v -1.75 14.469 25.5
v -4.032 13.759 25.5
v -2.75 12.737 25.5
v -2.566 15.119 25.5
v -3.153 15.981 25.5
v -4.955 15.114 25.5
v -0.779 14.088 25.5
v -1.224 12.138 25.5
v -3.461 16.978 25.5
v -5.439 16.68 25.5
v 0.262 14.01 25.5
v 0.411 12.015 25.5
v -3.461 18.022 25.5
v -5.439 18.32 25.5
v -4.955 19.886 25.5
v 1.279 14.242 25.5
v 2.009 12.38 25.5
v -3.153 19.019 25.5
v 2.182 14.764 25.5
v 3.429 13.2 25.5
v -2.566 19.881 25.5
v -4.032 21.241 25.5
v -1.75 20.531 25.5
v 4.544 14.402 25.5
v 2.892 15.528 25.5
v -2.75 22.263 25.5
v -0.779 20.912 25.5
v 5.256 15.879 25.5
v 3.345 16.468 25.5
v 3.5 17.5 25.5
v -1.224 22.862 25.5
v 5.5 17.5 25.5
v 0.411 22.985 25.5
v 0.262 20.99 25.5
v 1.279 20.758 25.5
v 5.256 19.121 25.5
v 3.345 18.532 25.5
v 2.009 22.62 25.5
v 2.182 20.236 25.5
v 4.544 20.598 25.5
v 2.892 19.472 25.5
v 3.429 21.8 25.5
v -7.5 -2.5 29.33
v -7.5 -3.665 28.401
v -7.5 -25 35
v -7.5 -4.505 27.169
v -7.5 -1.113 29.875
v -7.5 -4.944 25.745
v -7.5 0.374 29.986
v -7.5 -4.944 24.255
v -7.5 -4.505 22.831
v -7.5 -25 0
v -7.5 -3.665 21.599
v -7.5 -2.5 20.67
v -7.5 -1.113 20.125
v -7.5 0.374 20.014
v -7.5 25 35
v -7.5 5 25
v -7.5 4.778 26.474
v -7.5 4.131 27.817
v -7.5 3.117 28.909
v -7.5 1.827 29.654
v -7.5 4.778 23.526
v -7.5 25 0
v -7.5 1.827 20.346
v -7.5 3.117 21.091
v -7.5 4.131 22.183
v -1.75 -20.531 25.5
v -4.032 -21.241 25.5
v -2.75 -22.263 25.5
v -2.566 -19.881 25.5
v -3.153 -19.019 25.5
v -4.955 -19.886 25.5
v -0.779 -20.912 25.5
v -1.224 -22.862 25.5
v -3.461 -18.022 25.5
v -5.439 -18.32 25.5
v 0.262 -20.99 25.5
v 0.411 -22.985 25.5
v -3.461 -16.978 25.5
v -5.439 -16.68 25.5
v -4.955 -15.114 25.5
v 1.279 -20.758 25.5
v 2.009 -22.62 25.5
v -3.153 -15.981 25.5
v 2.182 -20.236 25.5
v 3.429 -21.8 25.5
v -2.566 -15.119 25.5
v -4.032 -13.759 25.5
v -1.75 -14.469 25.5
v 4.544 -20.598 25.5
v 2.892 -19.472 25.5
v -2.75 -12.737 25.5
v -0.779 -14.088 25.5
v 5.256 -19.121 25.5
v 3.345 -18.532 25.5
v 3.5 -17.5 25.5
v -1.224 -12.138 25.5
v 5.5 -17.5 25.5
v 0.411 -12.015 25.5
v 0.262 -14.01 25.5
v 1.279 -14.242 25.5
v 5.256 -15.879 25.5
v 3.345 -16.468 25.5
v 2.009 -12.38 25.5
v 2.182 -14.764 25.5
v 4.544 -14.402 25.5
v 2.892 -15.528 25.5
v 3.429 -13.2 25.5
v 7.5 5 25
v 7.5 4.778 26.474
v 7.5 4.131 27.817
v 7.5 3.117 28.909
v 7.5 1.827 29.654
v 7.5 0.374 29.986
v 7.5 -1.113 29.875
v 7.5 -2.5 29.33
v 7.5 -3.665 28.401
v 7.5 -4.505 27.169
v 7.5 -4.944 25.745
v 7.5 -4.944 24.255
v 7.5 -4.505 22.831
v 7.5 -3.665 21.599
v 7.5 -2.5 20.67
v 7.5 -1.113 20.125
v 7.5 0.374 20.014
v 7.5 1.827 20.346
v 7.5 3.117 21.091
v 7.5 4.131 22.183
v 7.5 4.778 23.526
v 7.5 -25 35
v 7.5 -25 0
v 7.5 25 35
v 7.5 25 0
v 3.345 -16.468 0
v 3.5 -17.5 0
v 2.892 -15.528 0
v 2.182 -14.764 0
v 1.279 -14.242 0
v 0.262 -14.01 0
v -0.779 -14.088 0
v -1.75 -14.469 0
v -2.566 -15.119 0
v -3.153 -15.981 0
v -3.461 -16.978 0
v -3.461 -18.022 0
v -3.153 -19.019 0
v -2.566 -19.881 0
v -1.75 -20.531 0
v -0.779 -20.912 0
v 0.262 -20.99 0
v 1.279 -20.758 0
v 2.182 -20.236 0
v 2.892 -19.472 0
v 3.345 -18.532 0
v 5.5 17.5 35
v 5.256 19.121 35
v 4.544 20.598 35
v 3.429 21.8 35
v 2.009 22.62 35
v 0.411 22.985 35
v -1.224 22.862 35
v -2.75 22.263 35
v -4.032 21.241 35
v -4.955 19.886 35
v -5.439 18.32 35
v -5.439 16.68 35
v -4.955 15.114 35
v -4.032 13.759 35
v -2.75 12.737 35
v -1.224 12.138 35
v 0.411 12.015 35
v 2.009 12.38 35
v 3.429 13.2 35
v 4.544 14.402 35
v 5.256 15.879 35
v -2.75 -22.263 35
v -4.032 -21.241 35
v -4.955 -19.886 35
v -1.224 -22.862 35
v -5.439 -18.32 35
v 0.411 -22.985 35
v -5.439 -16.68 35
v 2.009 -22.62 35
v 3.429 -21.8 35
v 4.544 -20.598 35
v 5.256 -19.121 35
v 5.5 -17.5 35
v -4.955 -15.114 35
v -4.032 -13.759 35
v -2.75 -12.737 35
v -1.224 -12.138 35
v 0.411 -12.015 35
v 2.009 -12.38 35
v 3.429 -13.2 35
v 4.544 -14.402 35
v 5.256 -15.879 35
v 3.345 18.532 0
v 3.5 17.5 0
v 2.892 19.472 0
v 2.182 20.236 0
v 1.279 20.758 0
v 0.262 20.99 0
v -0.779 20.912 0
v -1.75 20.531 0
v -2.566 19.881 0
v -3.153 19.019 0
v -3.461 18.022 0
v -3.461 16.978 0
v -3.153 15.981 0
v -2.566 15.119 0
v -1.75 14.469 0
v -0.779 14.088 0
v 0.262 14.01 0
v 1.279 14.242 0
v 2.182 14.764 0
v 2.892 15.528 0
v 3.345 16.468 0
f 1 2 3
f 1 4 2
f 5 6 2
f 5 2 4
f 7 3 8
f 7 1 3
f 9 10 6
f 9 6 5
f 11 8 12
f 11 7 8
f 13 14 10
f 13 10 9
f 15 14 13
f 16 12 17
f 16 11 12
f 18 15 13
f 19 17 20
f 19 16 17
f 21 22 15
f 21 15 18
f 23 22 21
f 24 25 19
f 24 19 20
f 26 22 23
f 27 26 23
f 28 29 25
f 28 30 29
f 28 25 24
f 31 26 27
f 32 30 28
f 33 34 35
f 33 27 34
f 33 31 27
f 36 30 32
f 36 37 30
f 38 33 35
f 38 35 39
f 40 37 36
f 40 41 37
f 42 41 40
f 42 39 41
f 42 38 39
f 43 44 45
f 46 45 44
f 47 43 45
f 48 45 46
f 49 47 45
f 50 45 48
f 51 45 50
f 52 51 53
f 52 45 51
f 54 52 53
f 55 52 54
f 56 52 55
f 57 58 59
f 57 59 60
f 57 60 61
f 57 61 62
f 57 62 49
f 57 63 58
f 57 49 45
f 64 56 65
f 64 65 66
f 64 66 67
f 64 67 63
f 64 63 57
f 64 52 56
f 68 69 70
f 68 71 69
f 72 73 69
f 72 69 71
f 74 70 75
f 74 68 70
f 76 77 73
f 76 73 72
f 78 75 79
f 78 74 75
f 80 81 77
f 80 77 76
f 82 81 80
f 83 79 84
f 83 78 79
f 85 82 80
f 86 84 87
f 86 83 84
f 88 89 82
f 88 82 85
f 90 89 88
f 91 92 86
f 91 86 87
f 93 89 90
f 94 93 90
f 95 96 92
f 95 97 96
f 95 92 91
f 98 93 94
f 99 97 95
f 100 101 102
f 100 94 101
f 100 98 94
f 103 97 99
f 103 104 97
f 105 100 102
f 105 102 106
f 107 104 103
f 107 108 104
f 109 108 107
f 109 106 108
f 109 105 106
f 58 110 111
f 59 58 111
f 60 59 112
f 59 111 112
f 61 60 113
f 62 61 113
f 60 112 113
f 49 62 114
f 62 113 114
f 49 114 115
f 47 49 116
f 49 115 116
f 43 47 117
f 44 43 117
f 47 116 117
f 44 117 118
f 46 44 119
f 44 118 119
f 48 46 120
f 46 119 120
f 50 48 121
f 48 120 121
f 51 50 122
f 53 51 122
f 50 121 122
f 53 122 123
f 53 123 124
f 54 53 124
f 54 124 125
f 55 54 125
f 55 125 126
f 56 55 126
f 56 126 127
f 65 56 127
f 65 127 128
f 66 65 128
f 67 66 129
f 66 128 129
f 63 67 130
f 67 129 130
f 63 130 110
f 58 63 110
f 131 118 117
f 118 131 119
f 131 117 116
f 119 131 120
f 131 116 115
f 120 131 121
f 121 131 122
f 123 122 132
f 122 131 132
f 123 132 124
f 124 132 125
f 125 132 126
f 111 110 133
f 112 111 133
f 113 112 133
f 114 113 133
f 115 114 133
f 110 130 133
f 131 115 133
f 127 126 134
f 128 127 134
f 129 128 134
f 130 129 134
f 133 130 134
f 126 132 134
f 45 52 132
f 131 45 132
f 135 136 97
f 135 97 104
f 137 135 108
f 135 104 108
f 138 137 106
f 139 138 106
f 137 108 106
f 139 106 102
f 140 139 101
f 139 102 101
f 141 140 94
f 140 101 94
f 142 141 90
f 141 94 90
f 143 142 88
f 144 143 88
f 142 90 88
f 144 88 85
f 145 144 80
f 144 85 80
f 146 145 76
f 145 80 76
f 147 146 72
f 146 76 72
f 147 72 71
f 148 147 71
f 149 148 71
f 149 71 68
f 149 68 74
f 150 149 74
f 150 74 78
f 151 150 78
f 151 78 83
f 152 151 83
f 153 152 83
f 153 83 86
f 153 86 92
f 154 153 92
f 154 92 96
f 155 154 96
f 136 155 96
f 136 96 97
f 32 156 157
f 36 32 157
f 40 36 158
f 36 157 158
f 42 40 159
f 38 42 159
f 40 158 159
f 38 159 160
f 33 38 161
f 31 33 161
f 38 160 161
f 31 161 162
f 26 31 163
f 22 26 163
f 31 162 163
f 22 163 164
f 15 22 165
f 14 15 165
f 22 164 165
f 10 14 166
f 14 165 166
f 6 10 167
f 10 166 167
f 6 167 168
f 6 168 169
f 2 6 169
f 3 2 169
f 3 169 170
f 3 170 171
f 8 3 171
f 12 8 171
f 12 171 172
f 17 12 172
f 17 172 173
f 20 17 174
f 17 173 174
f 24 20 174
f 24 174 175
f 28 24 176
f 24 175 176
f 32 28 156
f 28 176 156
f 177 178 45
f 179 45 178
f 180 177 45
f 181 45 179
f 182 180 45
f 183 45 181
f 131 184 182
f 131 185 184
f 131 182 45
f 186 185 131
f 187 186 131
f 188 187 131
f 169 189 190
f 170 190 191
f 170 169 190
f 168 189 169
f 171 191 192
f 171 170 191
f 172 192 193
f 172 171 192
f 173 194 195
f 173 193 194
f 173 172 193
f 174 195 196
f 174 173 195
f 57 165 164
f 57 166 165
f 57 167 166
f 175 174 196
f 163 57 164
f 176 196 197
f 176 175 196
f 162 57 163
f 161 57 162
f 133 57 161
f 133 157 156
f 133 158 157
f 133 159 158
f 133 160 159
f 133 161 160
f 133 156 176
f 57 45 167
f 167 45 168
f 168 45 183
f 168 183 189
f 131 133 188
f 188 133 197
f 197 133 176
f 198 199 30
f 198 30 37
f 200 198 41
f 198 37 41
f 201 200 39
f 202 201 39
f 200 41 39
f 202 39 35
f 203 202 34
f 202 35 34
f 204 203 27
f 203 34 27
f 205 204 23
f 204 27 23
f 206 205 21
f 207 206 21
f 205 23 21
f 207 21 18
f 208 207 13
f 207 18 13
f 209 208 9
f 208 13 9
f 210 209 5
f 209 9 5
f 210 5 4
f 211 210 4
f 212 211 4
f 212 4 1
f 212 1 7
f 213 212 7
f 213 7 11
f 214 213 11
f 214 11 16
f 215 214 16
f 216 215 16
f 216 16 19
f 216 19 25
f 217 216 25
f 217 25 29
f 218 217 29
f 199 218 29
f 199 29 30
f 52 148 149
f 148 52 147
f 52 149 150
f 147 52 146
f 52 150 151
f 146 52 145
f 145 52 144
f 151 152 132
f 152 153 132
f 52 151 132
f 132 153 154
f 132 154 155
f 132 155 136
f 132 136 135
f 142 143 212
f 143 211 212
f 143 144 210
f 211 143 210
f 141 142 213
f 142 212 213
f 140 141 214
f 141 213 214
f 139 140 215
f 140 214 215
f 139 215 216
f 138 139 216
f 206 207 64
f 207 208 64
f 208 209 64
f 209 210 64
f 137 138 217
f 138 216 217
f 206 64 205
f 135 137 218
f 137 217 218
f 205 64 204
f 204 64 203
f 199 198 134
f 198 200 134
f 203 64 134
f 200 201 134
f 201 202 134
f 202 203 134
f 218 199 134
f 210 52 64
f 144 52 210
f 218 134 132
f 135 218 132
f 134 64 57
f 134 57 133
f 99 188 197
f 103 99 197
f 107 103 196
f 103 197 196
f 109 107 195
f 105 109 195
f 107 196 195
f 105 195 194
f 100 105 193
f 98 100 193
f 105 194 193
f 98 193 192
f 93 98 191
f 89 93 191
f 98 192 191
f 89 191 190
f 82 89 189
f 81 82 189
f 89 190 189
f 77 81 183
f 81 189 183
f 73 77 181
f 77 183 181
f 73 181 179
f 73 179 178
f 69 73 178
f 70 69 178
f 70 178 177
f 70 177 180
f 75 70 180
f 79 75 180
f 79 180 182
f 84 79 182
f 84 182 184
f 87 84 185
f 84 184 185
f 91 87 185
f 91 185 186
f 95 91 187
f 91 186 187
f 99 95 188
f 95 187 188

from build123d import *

# Parameters (mm, degrees)
F0_W     = 15
F0_H     = 50
F1_DEPTH = 35
F2_R     = 5
F3_DEPTH = 15
F4_R     = 3.5
F5_DEPTH = 35
F6_R     = 5.5
F7_DEPTH = 9.5


with BuildPart() as f1:
    # F0 (on Top) → F1 (new body)
    with BuildSketch(Plane.XY):
        Rectangle(F0_W, F0_H)
    extrude(amount=F1_DEPTH)

    # F2 (on face) → F3 (cut, through all)
    with BuildSketch(Plane.YZ.offset(7.5)):
        with Locations((0, 25)):
            Circle(F2_R)
    extrude(amount=-F3_DEPTH, mode=Mode.SUBTRACT)

    # F4 (on face) → F5 (cut, through all)
    with BuildSketch(Plane.XY.offset(35)):
        with Locations((0, -17.5)):
            Circle(F4_R)
        with Locations((0, 17.5)):
            Circle(F4_R)
    extrude(amount=-F5_DEPTH, mode=Mode.SUBTRACT)

    # F6 (on face) → F7 (cut)
    with BuildSketch(Plane.XY.offset(35)):
        with Locations((0, -17.5)):
            Circle(F6_R)
        with Locations((0, 17.5)):
            Circle(F6_R)
    extrude(amount=-F7_DEPTH, mode=Mode.SUBTRACT)


solid = f1.part
